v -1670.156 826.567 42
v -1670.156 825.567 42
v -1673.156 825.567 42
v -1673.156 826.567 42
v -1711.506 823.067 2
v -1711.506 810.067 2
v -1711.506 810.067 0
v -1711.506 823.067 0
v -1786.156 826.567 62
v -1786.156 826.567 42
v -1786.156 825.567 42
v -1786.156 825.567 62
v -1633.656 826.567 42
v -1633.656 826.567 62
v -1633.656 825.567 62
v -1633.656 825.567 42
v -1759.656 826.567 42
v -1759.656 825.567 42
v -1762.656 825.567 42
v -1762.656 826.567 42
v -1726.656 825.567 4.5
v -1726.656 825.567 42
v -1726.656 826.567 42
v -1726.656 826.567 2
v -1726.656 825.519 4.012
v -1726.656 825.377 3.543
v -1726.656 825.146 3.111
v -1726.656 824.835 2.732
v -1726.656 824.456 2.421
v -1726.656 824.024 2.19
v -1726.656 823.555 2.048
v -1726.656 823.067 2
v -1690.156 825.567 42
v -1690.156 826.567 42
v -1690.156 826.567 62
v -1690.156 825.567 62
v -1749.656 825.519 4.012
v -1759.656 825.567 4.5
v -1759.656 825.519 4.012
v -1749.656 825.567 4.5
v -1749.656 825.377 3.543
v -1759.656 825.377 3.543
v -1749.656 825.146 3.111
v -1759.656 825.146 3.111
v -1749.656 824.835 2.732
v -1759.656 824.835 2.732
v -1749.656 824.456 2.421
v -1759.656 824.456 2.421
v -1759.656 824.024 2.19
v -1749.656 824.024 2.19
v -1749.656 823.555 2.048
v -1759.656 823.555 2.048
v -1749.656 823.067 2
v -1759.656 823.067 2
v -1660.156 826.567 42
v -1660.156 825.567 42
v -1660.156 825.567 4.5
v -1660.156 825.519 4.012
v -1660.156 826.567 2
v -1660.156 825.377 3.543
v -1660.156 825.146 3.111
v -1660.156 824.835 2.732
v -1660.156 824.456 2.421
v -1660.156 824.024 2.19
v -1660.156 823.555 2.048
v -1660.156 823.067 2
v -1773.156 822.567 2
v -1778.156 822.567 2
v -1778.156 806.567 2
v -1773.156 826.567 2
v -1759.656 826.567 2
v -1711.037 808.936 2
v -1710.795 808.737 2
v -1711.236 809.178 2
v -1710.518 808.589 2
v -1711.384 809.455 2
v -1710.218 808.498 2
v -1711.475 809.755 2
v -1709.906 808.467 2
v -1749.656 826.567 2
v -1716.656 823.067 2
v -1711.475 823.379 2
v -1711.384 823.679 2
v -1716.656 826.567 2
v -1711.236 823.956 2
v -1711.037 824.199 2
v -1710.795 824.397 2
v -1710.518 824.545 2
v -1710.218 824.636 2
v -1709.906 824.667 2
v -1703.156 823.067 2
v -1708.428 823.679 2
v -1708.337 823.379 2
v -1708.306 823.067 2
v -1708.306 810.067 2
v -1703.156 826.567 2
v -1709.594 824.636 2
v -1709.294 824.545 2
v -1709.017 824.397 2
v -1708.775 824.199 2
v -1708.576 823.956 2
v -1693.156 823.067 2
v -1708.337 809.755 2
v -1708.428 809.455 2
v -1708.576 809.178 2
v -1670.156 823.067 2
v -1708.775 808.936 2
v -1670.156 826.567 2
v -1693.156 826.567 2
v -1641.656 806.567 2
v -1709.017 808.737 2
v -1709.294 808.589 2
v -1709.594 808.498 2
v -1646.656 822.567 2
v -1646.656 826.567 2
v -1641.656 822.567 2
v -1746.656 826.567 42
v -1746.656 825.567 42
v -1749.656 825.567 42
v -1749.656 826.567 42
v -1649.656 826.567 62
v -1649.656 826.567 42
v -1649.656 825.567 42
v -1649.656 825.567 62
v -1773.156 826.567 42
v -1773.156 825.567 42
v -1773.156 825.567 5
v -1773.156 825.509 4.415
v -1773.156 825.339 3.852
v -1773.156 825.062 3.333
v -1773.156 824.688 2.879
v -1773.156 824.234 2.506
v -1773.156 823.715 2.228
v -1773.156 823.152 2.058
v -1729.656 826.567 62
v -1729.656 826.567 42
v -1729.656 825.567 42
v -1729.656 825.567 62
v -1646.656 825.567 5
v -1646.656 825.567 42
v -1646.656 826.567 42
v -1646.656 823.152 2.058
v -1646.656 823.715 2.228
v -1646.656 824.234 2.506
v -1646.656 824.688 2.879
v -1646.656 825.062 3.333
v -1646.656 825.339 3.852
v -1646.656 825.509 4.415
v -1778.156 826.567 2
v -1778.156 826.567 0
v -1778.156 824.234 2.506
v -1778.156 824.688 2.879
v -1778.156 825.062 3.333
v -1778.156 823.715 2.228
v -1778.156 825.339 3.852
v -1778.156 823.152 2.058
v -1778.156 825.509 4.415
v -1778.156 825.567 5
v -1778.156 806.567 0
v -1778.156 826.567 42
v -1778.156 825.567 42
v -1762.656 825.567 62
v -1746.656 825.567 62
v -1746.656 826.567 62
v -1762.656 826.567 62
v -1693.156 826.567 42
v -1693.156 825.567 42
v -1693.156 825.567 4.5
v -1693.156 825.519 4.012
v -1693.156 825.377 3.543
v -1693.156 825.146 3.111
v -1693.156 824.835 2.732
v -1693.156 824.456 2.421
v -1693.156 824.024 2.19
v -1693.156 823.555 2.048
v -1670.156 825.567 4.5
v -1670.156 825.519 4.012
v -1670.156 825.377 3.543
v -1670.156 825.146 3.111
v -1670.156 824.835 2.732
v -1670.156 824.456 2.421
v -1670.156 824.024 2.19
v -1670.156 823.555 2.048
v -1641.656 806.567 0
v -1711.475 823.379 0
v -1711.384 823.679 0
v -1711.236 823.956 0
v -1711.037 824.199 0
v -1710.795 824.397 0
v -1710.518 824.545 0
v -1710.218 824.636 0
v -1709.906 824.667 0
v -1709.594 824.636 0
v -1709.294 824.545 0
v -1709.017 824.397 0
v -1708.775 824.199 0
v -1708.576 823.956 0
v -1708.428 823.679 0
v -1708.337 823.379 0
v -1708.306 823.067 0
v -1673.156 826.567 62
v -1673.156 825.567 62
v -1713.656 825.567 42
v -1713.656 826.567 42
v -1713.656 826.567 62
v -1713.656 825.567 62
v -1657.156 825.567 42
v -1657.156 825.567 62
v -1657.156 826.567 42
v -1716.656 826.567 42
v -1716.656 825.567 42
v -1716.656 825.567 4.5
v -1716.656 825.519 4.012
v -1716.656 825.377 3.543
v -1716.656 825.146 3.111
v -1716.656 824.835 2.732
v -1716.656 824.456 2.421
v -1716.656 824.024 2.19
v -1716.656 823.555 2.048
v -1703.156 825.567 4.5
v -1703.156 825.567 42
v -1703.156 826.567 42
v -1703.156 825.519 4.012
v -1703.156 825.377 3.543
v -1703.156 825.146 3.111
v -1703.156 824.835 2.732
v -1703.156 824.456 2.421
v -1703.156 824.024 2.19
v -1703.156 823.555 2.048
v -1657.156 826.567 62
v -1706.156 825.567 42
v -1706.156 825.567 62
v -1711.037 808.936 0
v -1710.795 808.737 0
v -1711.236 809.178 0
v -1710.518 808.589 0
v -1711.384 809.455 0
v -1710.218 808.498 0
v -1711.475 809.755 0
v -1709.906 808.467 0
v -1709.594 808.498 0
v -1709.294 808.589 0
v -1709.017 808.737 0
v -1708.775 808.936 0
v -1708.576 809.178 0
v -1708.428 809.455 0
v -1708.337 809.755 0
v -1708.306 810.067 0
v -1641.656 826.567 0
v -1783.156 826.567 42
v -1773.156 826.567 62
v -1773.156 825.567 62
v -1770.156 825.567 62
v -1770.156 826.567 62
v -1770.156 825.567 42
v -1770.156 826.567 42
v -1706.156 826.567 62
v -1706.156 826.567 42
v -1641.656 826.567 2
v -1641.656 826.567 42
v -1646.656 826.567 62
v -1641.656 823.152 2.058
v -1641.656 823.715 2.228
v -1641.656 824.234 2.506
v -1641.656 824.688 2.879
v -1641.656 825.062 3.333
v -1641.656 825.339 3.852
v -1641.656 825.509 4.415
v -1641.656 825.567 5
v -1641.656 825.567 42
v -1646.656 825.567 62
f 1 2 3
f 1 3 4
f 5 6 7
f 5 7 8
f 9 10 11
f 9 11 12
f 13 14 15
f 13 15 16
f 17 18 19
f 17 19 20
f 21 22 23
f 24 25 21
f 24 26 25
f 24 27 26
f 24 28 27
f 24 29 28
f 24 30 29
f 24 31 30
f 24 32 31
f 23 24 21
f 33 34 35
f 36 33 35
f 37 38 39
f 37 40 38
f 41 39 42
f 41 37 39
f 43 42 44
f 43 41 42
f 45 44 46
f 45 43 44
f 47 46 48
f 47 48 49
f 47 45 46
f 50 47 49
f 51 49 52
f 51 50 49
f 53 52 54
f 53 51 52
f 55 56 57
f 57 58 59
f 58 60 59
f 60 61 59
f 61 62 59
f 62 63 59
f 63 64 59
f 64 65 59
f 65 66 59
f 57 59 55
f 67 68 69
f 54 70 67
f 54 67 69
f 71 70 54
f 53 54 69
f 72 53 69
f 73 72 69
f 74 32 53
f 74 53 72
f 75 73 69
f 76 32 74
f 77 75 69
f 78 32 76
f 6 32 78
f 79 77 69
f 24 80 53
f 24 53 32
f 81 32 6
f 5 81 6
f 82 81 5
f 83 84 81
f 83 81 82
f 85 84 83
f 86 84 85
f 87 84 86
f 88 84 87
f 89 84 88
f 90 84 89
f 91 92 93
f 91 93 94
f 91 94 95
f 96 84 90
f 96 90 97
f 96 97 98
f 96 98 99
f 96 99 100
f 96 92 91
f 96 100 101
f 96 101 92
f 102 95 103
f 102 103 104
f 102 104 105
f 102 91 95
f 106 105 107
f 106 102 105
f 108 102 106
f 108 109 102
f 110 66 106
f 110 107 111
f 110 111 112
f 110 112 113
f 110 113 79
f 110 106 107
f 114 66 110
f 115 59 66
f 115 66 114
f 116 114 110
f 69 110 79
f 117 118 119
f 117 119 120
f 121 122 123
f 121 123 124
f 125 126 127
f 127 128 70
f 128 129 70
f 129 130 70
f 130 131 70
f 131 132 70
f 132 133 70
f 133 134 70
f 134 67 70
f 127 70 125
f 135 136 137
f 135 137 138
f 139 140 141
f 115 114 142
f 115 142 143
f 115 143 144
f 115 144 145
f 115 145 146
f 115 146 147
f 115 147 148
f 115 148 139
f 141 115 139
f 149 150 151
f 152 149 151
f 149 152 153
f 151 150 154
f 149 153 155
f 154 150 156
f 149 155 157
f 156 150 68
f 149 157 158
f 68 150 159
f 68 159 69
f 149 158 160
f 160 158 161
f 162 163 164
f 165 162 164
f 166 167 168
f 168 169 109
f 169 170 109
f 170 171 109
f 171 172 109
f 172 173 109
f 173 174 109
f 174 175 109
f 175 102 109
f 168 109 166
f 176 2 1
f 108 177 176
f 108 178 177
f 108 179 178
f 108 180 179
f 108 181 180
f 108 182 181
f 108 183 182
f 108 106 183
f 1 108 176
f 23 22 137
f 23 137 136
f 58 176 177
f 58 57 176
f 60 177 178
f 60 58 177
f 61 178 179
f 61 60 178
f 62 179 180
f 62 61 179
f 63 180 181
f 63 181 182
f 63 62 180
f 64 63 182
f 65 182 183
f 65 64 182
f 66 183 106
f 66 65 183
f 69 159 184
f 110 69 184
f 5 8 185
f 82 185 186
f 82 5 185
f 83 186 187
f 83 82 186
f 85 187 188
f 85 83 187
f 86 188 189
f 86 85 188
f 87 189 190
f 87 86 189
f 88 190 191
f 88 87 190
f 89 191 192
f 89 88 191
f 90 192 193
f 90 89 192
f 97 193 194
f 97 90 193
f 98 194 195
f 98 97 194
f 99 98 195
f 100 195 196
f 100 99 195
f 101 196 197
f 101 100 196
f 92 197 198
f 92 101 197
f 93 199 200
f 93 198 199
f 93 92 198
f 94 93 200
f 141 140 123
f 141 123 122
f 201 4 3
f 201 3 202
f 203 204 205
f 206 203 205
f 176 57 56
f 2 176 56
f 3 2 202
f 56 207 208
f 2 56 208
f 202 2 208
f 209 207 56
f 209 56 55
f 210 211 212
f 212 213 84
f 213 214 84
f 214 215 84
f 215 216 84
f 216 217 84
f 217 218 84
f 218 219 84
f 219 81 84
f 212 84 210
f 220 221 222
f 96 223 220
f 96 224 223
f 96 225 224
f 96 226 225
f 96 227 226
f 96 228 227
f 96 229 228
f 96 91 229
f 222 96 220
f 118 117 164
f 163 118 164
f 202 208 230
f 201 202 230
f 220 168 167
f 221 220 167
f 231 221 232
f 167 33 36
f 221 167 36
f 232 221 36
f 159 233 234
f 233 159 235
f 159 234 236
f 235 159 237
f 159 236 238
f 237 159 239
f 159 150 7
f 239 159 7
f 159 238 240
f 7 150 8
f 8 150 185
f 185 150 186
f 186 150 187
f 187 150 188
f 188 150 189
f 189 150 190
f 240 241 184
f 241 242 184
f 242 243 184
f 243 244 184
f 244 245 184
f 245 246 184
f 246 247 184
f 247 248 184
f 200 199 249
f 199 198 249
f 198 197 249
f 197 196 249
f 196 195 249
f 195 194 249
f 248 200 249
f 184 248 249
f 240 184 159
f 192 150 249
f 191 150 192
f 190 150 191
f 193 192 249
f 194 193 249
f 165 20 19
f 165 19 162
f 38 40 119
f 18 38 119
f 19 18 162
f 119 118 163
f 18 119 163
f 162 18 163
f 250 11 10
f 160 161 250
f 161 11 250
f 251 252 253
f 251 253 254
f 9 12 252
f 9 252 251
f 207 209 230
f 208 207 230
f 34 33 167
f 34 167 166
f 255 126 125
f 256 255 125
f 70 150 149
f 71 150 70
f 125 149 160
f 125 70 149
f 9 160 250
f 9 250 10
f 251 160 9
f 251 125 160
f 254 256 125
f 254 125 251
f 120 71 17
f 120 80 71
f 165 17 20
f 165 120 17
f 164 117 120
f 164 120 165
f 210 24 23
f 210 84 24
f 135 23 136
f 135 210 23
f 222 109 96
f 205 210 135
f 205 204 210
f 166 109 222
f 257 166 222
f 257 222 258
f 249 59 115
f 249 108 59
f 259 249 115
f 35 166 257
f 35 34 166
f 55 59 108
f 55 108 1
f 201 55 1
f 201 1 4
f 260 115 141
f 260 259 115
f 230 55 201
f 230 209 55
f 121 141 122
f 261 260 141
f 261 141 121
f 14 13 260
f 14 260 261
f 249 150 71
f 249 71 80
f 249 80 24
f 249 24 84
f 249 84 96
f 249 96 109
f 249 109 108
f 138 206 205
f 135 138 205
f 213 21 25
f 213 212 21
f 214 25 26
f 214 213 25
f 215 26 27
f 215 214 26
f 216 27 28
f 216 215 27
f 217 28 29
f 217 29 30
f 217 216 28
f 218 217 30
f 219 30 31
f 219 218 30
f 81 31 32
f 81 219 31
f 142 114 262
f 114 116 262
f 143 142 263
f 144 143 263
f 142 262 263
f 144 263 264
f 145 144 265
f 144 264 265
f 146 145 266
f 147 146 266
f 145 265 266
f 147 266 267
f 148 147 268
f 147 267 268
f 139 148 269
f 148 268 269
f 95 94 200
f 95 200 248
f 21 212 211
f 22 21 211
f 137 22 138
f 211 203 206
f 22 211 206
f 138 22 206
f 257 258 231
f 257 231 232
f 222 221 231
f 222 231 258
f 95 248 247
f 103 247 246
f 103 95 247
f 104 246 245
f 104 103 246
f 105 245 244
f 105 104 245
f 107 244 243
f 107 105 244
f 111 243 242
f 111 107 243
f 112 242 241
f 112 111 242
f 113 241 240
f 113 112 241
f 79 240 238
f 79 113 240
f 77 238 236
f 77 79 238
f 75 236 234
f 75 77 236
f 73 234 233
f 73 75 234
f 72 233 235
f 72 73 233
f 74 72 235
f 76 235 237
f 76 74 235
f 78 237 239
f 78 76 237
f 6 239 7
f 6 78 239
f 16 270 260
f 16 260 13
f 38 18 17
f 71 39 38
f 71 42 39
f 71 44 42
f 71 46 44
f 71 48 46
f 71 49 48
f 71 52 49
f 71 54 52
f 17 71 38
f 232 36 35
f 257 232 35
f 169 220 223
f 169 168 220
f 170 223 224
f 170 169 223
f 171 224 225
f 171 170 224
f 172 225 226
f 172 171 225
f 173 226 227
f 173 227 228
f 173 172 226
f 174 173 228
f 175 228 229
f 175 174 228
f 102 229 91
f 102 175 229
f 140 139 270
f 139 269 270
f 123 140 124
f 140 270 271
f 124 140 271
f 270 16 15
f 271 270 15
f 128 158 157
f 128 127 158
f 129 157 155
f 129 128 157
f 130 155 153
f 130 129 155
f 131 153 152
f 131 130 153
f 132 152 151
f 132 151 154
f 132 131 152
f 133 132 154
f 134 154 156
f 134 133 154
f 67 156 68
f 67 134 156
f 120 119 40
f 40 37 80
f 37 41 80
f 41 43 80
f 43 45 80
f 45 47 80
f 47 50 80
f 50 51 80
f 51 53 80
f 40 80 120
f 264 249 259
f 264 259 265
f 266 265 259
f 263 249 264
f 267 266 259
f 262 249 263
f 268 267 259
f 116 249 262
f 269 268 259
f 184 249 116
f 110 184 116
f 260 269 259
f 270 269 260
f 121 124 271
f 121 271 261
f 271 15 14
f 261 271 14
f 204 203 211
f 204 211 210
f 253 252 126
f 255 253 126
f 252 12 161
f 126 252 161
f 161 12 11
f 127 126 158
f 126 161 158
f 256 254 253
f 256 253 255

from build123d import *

# Parameters (mm, degrees)
SKETCH1_W                 = 146.5
SKETCH1_H                 = 20
BOSS_EXTRUDE1_DEPTH       = 2
SKETCH2_W                 = 10
SKETCH2_H                 = 1
BOSS_EXTRUDE2_DEPTH       = 60
SKETCH3_W                 = 20
SKETCH3_H                 = 1
BOSS_EXTRUDE3_DEPTH       = 3
SKETCH4_W                 = 20
SKETCH4_H                 = 1
BOSS_EXTRUDE4_DEPTH       = 3
BOSS_EXTRUDE5_DEPTH       = 3
BOSS_EXTRUDE5_DEPTH_BACK  = 13
SKETCH5_W                 = 20
SKETCH5_H                 = 1
BOSS_EXTRUDE7_DEPTH       = 3
BOSS_EXTRUDE7_DEPTH_BACK  = 13
SKETCH7_W                 = 20
SKETCH7_H                 = 1
BOSS_EXTRUDE9_DEPTH       = 3
BOSS_EXTRUDE9_DEPTH_BACK  = 13
SKETCH9_W                 = 20
SKETCH9_H                 = 1
BOSS_EXTRUDE11_DEPTH      = 3
BOSS_EXTRUDE11_DEPTH_BACK = 13
SKETCH11_W                = 20
SKETCH11_H                = 1
SKETCH13_W                = 30
SKETCH13_H                = 1
BOSS_EXTRUDE13_DEPTH      = 3
SKETCH14_W                = 20
SKETCH14_H                = 1
BOSS_EXTRUDE14_DEPTH      = 3
CUT_EXTRUDE1_DEPTH        = 3
SKETCH16_W                = 5
SKETCH16_H                = 20
CUT_EXTRUDE2_DEPTH        = 10
SKETCH17_W                = 5
SKETCH17_H                = 40
SKETCH17_W_2              = 8
CUT_EXTRUDE3_DEPTH        = 10
FILLET1_R                 = 3
FILLET2_R                 = 2.5


with BuildPart() as part:
    # Sketch1 → Boss-Extrude1 (new body)
    with BuildSketch(Plane.XY):
        with Locations((-1709.906073211, 816.567138103)):
            Rectangle(SKETCH1_W, SKETCH1_H)
    extrude(amount=BOSS_EXTRUDE1_DEPTH)

    # Sketch2 → Boss-Extrude2 (add)
    with BuildSketch(Plane.XY.offset(2)):
        with Locations((-1778.156073211, 826.067138103)):
            Rectangle(SKETCH2_W, SKETCH2_H)
        with Locations((-1754.656073211, 826.067138103)):
            Rectangle(SKETCH2_W, SKETCH2_H)
        with Locations((-1641.656073211, 826.067138103)):
            Rectangle(SKETCH2_W, SKETCH2_H)
        with Locations((-1665.156073211, 826.067138103)):
            Rectangle(SKETCH2_W, SKETCH2_H)
        with Locations((-1721.656073211, 826.067138103)):
            Rectangle(SKETCH2_W, SKETCH2_H)
        with Locations((-1698.156073211, 826.067138103)):
            Rectangle(SKETCH2_W, SKETCH2_H)
    extrude(amount=BOSS_EXTRUDE2_DEPTH)

    # Sketch3 → Boss-Extrude3 (add)
    with BuildSketch(Plane.ZY.offset(1783.156073211)):
        with Locations((52, 826.067138103)):
            Rectangle(SKETCH3_W, SKETCH3_H)
    extrude(amount=BOSS_EXTRUDE3_DEPTH)

    # Sketch4 → Boss-Extrude4 (add)
    with BuildSketch(Plane(origin=(-1773.156073211, 0, 0), x_dir=(0, 0, -1), z_dir=(1, 0, 0))):
        with Locations((-52, 826.067138104)):
            Rectangle(SKETCH4_W, SKETCH4_H)
    extrude(amount=BOSS_EXTRUDE4_DEPTH)

    # Sketch5 → Boss-Extrude5 (add, two sides: drawn at the far end of the back side and taken through both)
    with BuildSketch(Plane.ZY.offset(1759.656073211).offset(-BOSS_EXTRUDE5_DEPTH_BACK)):
        with Locations((52, 826.067138103)):
            Rectangle(SKETCH5_W, SKETCH5_H)
    extrude(amount=BOSS_EXTRUDE5_DEPTH + BOSS_EXTRUDE5_DEPTH_BACK)

    # Sketch7 → Boss-Extrude7 (add, two sides: drawn at the far end of the back side and taken through both)
    with BuildSketch(Plane.ZY.offset(1726.656073211).offset(-BOSS_EXTRUDE7_DEPTH_BACK)):
        with Locations((52, 826.067138103)):
            Rectangle(SKETCH7_W, SKETCH7_H)
    extrude(amount=BOSS_EXTRUDE7_DEPTH + BOSS_EXTRUDE7_DEPTH_BACK)

    # Sketch9 → Boss-Extrude9 (add, two sides: drawn at the far end of the back side and taken through both)
    with BuildSketch(Plane.ZY.offset(1703.156073211).offset(-BOSS_EXTRUDE9_DEPTH_BACK)):
        with Locations((52, 826.067138103)):
            Rectangle(SKETCH9_W, SKETCH9_H)
    extrude(amount=BOSS_EXTRUDE9_DEPTH + BOSS_EXTRUDE9_DEPTH_BACK)

    # Sketch11 → Boss-Extrude11 (add, two sides: drawn at the far end of the back side and taken through both)
    with BuildSketch(Plane.ZY.offset(1670.156073211).offset(-BOSS_EXTRUDE11_DEPTH_BACK)):
        with Locations((52, 826.067138103)):
            Rectangle(SKETCH11_W, SKETCH11_H)
    extrude(amount=BOSS_EXTRUDE11_DEPTH + BOSS_EXTRUDE11_DEPTH_BACK)

    # Sketch13 → Boss-Extrude13 (add)
    with BuildSketch(Plane(origin=(-1636.656073211, 0, 0), x_dir=(0, 0, -1), z_dir=(1, 0, 0))):
        with Locations((-47, 826.067138103)):
            Rectangle(SKETCH13_W, SKETCH13_H)
    extrude(amount=BOSS_EXTRUDE13_DEPTH)

    # Sketch14 → Boss-Extrude14 (add)
    with BuildSketch(Plane.ZY.offset(1646.656073212)):
        with Locations((52, 826.067138102)):
            Rectangle(SKETCH14_W, SKETCH14_H)
    extrude(amount=BOSS_EXTRUDE14_DEPTH)

    # Sketch15 → Cut-Extrude1 (cut)
    with BuildSketch(Plane.XY.offset(2)):
        with BuildLine():
            Line((-1711.506073211, 810.067138103), (-1711.506073211, 823.067138103))
            ThreePointArc((-1711.506073211, 823.067138103), (-1709.906073211, 824.667138103), (-1708.306073211, 823.067138103))
            Line((-1708.306073211, 823.067138103), (-1708.306073211, 810.067138103))
            ThreePointArc((-1708.306073211, 810.067138103), (-1709.906073211, 808.467138103), (-1711.506073211, 810.067138103))
        make_face()
    extrude(amount=-CUT_EXTRUDE1_DEPTH, mode=Mode.SUBTRACT)

    # Sketch16 → Cut-Extrude2 (cut)
    with BuildSketch(Plane.XY.offset(2)):
        with Locations((-1780.656073211, 816.567138103)):
            Rectangle(SKETCH16_W, SKETCH16_H)
        with Locations((-1639.156073211, 816.567138103)):
            Rectangle(SKETCH16_W, SKETCH16_H)
    extrude(amount=-CUT_EXTRUDE2_DEPTH, mode=Mode.SUBTRACT)

    # Sketch17 → Cut-Extrude3 (cut)
    with BuildSketch(Plane.XZ.offset(-825.567138103)):
        with Locations((-1780.656073211, 22)):
            Rectangle(SKETCH17_W, SKETCH17_H)
        with Locations((-1637.656073211, 22)):
            Rectangle(SKETCH17_W_2, SKETCH17_H)
    extrude(amount=-CUT_EXTRUDE3_DEPTH, mode=Mode.SUBTRACT)

    # Fillet1
    fillet1_edges = [part.edges().sort_by_distance(p)[0] for p in [
        (-1775.656073211, 825.567138103, 2),
        (-1644.156073211, 825.567138103, 2),
    ]]
    fillet(fillet1_edges, radius=FILLET1_R)

    # Fillet2
    fillet2_edges = [part.edges().sort_by_distance(p)[0] for p in [
        (-1754.656073211, 825.567138103, 2),
        (-1665.156073211, 825.567138103, 2),
        (-1721.656073211, 825.567138103, 2),
        (-1698.156073211, 825.567138103, 2),
    ]]
    fillet(fillet2_edges, radius=FILLET2_R)


solid = part.part
